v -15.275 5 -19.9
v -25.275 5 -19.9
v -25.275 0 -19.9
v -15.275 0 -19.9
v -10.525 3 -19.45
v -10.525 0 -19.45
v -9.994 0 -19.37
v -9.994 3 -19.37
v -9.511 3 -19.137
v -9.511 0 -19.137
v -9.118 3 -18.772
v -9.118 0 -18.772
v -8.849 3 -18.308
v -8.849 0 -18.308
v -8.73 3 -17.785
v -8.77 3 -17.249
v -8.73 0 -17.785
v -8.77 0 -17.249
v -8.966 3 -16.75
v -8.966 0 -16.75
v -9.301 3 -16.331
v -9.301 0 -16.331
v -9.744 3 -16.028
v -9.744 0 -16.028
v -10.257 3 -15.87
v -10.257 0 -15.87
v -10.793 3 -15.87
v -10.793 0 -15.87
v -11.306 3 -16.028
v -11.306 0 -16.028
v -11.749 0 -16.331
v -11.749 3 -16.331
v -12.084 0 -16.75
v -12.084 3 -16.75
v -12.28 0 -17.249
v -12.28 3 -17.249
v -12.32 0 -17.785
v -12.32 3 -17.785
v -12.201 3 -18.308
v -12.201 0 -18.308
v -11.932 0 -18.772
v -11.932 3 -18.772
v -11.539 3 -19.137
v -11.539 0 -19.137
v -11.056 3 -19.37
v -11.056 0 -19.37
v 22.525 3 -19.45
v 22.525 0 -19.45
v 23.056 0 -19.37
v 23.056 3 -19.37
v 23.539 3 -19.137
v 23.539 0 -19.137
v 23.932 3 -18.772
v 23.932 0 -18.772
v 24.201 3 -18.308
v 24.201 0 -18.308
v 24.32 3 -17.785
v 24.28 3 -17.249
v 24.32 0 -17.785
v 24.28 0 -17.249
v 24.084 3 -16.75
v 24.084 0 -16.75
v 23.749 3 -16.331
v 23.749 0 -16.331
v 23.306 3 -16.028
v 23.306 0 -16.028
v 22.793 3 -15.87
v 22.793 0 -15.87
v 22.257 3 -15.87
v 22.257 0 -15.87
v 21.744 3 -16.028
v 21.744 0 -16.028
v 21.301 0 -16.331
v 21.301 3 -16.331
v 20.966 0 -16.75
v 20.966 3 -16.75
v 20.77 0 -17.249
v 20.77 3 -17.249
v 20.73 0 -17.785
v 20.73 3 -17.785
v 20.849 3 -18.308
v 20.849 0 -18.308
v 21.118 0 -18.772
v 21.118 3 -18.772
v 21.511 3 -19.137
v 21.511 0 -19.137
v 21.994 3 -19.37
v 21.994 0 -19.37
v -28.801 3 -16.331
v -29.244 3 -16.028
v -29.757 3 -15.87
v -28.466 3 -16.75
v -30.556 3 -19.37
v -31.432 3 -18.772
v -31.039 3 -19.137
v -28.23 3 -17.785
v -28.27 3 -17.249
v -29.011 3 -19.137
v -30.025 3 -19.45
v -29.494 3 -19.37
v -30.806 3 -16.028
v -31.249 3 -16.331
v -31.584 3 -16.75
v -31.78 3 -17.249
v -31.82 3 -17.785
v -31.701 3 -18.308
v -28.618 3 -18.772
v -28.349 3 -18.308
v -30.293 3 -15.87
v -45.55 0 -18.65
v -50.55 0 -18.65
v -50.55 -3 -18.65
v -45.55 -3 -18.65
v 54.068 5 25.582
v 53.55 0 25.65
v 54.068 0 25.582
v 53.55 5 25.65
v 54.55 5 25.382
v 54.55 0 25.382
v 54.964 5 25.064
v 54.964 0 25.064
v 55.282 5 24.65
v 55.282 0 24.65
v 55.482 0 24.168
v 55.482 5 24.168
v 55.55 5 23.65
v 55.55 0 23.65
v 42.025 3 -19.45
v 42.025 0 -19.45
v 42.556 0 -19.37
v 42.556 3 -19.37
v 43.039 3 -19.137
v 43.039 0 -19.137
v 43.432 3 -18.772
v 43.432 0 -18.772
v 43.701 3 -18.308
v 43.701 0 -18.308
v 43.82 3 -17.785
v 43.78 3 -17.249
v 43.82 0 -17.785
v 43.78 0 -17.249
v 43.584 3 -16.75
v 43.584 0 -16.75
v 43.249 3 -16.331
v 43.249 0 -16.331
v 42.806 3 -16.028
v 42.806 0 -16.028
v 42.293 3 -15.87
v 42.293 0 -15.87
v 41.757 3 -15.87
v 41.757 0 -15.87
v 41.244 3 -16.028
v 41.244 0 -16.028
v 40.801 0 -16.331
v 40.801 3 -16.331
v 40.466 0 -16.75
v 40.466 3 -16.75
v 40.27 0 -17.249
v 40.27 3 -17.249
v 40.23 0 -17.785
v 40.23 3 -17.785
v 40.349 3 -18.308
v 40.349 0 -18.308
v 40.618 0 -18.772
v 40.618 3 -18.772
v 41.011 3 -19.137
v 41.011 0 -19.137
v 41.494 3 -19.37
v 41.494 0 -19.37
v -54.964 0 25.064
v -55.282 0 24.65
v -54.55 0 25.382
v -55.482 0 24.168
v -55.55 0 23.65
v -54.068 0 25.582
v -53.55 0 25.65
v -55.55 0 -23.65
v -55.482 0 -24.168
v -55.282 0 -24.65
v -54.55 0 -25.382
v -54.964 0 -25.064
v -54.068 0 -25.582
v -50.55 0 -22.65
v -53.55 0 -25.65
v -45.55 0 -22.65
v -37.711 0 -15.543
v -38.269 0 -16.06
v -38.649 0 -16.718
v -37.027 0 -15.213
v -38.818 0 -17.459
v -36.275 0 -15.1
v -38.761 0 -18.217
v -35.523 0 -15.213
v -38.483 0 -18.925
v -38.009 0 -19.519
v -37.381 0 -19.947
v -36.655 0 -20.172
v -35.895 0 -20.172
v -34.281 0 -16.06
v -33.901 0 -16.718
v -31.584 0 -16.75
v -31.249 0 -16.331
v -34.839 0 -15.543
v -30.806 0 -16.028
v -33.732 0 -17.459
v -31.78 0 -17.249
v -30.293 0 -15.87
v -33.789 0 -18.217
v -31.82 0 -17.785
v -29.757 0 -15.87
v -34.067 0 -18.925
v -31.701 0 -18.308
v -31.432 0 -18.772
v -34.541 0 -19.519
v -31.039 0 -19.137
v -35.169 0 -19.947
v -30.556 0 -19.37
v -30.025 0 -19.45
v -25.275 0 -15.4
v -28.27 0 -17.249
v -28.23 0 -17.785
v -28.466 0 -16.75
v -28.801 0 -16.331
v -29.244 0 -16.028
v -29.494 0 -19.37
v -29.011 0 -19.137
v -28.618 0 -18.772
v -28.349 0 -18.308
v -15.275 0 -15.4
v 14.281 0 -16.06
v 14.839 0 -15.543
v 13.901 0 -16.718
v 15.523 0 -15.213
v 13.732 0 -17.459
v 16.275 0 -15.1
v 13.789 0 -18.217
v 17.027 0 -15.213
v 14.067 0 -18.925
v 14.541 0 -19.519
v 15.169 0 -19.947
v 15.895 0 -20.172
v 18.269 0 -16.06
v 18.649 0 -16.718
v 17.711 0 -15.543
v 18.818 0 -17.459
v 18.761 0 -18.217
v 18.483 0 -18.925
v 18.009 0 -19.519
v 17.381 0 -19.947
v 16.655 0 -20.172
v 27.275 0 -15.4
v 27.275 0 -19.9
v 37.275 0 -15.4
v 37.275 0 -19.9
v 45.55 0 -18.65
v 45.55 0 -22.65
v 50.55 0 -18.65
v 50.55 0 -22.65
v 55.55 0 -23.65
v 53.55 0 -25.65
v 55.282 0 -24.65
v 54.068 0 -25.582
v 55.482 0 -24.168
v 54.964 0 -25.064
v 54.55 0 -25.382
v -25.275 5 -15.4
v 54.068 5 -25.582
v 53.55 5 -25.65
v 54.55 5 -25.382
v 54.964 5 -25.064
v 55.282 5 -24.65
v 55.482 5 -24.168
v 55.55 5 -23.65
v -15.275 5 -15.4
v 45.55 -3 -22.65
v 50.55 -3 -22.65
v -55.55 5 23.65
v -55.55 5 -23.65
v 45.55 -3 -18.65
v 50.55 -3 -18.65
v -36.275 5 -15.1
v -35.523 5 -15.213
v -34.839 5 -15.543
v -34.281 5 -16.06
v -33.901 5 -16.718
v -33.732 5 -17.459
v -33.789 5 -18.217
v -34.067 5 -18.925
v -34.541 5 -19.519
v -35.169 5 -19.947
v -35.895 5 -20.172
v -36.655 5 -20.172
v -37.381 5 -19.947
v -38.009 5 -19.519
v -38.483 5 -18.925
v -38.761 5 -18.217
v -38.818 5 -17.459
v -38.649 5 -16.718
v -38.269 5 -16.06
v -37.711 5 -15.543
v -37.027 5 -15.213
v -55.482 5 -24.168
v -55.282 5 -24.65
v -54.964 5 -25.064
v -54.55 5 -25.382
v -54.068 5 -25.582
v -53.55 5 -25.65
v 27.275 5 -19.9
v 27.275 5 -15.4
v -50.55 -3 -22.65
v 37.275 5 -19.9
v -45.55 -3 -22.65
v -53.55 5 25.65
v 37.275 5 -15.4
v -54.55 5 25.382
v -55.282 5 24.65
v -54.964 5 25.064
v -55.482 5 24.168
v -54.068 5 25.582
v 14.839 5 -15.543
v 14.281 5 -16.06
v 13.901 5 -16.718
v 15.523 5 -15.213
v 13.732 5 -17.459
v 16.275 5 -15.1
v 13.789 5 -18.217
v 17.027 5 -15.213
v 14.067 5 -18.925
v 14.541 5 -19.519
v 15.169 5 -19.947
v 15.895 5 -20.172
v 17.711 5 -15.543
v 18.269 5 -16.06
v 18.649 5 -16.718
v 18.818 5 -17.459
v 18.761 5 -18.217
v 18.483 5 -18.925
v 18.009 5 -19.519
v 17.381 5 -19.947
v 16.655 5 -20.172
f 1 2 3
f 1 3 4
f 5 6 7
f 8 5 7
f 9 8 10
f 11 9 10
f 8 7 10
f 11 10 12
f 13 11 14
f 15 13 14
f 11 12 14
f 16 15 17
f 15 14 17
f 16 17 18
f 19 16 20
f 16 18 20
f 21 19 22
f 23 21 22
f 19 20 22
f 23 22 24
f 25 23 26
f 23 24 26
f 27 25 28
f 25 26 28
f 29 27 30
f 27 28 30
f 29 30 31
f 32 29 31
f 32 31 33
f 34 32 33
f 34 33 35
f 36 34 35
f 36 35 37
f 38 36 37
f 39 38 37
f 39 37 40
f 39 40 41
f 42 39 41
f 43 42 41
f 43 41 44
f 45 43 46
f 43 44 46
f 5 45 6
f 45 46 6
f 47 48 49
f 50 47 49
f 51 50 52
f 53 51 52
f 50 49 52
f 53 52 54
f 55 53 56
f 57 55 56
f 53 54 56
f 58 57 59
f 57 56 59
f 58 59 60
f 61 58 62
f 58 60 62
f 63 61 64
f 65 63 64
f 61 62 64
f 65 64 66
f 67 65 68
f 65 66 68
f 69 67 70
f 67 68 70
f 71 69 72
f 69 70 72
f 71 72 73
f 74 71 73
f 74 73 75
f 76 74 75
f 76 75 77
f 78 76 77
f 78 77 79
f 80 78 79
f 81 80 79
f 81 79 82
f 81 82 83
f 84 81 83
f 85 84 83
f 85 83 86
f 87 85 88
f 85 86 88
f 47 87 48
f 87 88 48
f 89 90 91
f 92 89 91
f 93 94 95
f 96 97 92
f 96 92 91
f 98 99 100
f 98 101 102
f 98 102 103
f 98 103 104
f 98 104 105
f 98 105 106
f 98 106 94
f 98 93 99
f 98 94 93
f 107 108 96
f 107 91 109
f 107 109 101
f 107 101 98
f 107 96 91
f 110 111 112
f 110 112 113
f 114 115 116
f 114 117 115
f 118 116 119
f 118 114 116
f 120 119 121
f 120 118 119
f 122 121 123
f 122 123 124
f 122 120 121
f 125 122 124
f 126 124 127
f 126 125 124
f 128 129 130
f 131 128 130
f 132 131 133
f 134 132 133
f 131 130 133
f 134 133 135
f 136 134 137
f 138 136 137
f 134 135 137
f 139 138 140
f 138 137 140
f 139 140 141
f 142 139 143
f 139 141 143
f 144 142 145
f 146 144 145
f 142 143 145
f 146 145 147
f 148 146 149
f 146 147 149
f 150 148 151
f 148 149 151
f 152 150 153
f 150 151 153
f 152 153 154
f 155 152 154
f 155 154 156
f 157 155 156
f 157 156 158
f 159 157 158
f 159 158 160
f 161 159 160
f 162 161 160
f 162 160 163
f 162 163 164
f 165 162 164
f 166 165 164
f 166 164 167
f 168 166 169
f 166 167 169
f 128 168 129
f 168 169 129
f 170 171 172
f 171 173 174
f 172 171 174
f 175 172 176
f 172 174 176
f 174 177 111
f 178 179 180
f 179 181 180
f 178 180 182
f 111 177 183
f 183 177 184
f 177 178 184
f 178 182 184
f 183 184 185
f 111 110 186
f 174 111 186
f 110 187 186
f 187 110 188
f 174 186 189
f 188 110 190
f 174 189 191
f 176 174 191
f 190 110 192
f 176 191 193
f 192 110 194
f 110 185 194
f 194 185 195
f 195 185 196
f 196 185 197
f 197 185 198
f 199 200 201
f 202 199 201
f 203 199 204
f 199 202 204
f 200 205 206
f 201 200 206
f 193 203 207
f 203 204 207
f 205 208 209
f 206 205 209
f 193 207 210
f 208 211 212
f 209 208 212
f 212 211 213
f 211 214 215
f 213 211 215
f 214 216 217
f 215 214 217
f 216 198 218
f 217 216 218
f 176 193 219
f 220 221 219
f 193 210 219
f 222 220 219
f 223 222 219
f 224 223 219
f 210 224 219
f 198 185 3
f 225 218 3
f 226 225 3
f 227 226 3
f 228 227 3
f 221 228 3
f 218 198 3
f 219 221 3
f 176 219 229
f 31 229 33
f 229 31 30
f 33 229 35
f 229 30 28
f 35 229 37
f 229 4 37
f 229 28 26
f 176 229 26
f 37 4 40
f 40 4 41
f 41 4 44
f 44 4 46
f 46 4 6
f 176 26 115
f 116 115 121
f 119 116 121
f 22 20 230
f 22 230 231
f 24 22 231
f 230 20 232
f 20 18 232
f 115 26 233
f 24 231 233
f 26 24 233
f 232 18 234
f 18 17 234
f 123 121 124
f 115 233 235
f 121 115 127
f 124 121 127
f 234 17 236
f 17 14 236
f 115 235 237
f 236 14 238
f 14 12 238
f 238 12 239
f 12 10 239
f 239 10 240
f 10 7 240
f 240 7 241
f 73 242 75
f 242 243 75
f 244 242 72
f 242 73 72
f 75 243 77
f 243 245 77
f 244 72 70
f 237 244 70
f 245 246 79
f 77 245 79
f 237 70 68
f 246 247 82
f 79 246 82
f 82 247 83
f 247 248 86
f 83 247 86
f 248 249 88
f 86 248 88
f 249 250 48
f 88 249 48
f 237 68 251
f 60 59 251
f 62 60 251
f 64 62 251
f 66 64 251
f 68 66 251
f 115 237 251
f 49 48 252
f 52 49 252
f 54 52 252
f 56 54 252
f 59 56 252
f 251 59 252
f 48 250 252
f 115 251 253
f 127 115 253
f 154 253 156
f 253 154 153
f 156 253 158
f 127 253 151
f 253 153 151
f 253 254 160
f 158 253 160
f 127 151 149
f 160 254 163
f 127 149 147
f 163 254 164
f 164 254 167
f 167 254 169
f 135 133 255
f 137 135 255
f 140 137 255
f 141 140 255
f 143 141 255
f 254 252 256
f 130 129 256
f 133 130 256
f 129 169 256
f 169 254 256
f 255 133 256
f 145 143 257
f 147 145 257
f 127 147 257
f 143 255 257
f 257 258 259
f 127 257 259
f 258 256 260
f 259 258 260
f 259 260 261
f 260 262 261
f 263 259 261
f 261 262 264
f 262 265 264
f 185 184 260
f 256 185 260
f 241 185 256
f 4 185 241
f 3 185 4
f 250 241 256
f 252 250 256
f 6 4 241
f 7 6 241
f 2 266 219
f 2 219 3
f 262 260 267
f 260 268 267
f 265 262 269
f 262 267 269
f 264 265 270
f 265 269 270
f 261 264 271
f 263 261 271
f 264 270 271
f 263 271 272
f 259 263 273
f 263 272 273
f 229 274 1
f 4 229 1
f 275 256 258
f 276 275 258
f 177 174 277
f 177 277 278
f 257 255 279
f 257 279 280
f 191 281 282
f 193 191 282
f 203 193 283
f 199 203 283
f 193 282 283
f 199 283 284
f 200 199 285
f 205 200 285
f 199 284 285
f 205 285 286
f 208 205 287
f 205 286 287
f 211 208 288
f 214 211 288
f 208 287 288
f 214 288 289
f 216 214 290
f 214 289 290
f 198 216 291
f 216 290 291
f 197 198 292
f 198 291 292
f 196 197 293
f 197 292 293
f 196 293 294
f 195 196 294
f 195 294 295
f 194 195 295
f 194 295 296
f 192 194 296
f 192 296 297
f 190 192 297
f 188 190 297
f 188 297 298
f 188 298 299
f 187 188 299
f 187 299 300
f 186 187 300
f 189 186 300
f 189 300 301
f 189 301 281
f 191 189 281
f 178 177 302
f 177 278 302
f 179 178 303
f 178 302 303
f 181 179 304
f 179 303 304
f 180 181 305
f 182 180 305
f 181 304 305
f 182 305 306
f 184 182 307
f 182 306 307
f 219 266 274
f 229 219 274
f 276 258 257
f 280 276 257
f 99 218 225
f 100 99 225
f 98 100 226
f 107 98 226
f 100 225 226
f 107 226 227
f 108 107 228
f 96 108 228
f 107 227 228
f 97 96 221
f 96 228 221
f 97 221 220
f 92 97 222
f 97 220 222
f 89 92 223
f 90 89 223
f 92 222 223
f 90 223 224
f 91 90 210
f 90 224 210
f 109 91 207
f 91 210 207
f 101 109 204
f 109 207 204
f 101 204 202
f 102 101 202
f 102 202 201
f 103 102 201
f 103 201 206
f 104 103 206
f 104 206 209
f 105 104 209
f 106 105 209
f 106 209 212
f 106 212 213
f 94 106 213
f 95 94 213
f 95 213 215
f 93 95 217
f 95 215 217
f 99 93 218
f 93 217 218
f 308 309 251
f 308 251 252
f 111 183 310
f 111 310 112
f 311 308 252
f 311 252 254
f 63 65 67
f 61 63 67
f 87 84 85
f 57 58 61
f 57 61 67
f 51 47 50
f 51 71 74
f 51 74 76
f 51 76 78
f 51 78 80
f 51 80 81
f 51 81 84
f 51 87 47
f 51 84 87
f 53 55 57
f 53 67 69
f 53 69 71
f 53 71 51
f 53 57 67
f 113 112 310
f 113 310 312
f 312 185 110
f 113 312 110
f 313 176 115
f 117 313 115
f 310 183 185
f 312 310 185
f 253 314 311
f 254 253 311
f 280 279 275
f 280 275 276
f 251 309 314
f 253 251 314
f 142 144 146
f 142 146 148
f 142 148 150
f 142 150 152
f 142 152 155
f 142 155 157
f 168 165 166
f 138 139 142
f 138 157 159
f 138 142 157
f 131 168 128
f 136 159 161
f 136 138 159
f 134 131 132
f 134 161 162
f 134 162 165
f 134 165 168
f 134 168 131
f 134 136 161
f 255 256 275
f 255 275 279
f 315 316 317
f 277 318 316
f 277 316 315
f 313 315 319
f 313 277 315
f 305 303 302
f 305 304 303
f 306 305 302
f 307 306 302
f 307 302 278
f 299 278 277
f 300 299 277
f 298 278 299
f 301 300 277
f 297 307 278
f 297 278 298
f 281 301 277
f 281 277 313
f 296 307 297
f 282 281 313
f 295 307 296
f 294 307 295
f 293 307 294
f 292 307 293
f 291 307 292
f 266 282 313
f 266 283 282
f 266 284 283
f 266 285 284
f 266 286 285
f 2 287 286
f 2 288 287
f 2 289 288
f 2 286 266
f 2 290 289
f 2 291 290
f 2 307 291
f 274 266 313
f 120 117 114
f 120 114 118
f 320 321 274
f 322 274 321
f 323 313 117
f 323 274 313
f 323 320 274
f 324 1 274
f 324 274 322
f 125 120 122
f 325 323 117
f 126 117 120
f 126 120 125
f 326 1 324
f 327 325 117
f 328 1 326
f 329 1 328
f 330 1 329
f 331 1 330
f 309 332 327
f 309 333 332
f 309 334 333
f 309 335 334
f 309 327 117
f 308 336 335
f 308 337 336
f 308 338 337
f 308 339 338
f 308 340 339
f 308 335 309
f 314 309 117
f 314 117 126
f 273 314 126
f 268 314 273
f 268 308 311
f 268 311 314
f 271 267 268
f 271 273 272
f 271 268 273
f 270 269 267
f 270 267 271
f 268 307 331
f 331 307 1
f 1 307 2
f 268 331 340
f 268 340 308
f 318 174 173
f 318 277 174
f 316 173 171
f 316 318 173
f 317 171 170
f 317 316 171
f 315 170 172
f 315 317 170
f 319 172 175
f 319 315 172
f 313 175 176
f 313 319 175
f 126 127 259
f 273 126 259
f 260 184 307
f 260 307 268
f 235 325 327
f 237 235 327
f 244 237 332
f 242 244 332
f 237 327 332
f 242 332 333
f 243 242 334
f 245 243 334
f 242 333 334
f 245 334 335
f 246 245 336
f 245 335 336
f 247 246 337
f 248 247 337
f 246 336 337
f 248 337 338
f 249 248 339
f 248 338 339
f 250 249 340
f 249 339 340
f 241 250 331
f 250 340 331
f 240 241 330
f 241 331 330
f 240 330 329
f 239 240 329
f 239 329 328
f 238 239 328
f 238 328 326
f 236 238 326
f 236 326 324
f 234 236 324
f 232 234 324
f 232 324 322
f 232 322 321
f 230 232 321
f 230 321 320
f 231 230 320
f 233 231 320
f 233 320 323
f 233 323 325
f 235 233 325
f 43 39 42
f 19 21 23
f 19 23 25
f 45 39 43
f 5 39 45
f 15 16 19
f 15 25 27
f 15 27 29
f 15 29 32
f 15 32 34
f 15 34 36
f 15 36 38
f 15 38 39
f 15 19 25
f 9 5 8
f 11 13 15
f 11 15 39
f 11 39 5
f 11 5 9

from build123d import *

# Parameters (mm, degrees)
SKETCH1_W           = 111.1
SKETCH1_H           = 51.3
BOSS_EXTRUDE1_DEPTH = 5
SKETCH9_W           = 5
SKETCH9_H           = 4
BOSS_EXTRUDE5_DEPTH = 3
SKETCH10_R          = 2.55
SKETCH10_W          = 10
SKETCH10_H          = 4.5
CUT_EXTRUDE1_DEPTH  = 10
SKETCH11_R          = 1.8
CUT_EXTRUDE2_DEPTH  = 3
FILLET1_R           = 2


with BuildPart() as part:
    # Sketch1 → Boss-Extrude1 (new body)
    with BuildSketch(Plane(origin=(0, 0, 0), x_dir=(1, 0, 0), z_dir=(0, 1, 0))):
        Rectangle(SKETCH1_W, SKETCH1_H)
    extrude(amount=BOSS_EXTRUDE1_DEPTH)

    # Sketch9 → Boss-Extrude5 (add)
    with BuildSketch(Plane.XZ):
        with Locations((-48.05, -20.65)):
            Rectangle(SKETCH9_W, SKETCH9_H)
        with Locations((48.05, -20.65)):
            Rectangle(SKETCH9_W, SKETCH9_H)
    extrude(amount=BOSS_EXTRUDE5_DEPTH)

    # Sketch10 → Cut-Extrude1 (cut)
    with BuildSketch(Plane(origin=(0, 5, 0), x_dir=(1, 0, 0), z_dir=(0, 1, 0))):
        with Locations(Location((-36.275, 17.65, 0), (0, 0, 270))):
            Circle(SKETCH10_R)
        with Locations(Location((16.275, 17.65, 0), (0, 0, 270))):
            Circle(SKETCH10_R)
        with Locations((-20.275, 17.65)):
            Rectangle(SKETCH10_W, SKETCH10_H)
        with Locations((32.275, 17.65)):
            Rectangle(SKETCH10_W, SKETCH10_H)
    extrude(amount=-CUT_EXTRUDE1_DEPTH, mode=Mode.SUBTRACT)

    # Sketch11 → Cut-Extrude2 (cut)
    with BuildSketch(Plane.XZ):
        with Locations(Location((-30.025, -17.65, 0), (0, 0, 270))):
            Circle(SKETCH11_R)
        with Locations(Location((-10.525, -17.65, 0), (0, 0, 270))):
            Circle(SKETCH11_R)
        with Locations(Location((22.525, -17.65, 0), (0, 0, 270))):
            Circle(SKETCH11_R)
        with Locations(Location((42.025, -17.65, 0), (0, 0, 270))):
            Circle(SKETCH11_R)
    extrude(amount=-CUT_EXTRUDE2_DEPTH, mode=Mode.SUBTRACT)

    # Fillet1
    fillet1_edges = [part.edges().sort_by_distance(p)[0] for p in [
        (-55.55, 2.5, -25.65),
        (55.55, 2.5, -25.65),
        (55.55, 2.5, 25.65),
        (-55.55, 2.5, 25.65),
    ]]
    fillet(fillet1_edges, radius=FILLET1_R)


solid = part.part
